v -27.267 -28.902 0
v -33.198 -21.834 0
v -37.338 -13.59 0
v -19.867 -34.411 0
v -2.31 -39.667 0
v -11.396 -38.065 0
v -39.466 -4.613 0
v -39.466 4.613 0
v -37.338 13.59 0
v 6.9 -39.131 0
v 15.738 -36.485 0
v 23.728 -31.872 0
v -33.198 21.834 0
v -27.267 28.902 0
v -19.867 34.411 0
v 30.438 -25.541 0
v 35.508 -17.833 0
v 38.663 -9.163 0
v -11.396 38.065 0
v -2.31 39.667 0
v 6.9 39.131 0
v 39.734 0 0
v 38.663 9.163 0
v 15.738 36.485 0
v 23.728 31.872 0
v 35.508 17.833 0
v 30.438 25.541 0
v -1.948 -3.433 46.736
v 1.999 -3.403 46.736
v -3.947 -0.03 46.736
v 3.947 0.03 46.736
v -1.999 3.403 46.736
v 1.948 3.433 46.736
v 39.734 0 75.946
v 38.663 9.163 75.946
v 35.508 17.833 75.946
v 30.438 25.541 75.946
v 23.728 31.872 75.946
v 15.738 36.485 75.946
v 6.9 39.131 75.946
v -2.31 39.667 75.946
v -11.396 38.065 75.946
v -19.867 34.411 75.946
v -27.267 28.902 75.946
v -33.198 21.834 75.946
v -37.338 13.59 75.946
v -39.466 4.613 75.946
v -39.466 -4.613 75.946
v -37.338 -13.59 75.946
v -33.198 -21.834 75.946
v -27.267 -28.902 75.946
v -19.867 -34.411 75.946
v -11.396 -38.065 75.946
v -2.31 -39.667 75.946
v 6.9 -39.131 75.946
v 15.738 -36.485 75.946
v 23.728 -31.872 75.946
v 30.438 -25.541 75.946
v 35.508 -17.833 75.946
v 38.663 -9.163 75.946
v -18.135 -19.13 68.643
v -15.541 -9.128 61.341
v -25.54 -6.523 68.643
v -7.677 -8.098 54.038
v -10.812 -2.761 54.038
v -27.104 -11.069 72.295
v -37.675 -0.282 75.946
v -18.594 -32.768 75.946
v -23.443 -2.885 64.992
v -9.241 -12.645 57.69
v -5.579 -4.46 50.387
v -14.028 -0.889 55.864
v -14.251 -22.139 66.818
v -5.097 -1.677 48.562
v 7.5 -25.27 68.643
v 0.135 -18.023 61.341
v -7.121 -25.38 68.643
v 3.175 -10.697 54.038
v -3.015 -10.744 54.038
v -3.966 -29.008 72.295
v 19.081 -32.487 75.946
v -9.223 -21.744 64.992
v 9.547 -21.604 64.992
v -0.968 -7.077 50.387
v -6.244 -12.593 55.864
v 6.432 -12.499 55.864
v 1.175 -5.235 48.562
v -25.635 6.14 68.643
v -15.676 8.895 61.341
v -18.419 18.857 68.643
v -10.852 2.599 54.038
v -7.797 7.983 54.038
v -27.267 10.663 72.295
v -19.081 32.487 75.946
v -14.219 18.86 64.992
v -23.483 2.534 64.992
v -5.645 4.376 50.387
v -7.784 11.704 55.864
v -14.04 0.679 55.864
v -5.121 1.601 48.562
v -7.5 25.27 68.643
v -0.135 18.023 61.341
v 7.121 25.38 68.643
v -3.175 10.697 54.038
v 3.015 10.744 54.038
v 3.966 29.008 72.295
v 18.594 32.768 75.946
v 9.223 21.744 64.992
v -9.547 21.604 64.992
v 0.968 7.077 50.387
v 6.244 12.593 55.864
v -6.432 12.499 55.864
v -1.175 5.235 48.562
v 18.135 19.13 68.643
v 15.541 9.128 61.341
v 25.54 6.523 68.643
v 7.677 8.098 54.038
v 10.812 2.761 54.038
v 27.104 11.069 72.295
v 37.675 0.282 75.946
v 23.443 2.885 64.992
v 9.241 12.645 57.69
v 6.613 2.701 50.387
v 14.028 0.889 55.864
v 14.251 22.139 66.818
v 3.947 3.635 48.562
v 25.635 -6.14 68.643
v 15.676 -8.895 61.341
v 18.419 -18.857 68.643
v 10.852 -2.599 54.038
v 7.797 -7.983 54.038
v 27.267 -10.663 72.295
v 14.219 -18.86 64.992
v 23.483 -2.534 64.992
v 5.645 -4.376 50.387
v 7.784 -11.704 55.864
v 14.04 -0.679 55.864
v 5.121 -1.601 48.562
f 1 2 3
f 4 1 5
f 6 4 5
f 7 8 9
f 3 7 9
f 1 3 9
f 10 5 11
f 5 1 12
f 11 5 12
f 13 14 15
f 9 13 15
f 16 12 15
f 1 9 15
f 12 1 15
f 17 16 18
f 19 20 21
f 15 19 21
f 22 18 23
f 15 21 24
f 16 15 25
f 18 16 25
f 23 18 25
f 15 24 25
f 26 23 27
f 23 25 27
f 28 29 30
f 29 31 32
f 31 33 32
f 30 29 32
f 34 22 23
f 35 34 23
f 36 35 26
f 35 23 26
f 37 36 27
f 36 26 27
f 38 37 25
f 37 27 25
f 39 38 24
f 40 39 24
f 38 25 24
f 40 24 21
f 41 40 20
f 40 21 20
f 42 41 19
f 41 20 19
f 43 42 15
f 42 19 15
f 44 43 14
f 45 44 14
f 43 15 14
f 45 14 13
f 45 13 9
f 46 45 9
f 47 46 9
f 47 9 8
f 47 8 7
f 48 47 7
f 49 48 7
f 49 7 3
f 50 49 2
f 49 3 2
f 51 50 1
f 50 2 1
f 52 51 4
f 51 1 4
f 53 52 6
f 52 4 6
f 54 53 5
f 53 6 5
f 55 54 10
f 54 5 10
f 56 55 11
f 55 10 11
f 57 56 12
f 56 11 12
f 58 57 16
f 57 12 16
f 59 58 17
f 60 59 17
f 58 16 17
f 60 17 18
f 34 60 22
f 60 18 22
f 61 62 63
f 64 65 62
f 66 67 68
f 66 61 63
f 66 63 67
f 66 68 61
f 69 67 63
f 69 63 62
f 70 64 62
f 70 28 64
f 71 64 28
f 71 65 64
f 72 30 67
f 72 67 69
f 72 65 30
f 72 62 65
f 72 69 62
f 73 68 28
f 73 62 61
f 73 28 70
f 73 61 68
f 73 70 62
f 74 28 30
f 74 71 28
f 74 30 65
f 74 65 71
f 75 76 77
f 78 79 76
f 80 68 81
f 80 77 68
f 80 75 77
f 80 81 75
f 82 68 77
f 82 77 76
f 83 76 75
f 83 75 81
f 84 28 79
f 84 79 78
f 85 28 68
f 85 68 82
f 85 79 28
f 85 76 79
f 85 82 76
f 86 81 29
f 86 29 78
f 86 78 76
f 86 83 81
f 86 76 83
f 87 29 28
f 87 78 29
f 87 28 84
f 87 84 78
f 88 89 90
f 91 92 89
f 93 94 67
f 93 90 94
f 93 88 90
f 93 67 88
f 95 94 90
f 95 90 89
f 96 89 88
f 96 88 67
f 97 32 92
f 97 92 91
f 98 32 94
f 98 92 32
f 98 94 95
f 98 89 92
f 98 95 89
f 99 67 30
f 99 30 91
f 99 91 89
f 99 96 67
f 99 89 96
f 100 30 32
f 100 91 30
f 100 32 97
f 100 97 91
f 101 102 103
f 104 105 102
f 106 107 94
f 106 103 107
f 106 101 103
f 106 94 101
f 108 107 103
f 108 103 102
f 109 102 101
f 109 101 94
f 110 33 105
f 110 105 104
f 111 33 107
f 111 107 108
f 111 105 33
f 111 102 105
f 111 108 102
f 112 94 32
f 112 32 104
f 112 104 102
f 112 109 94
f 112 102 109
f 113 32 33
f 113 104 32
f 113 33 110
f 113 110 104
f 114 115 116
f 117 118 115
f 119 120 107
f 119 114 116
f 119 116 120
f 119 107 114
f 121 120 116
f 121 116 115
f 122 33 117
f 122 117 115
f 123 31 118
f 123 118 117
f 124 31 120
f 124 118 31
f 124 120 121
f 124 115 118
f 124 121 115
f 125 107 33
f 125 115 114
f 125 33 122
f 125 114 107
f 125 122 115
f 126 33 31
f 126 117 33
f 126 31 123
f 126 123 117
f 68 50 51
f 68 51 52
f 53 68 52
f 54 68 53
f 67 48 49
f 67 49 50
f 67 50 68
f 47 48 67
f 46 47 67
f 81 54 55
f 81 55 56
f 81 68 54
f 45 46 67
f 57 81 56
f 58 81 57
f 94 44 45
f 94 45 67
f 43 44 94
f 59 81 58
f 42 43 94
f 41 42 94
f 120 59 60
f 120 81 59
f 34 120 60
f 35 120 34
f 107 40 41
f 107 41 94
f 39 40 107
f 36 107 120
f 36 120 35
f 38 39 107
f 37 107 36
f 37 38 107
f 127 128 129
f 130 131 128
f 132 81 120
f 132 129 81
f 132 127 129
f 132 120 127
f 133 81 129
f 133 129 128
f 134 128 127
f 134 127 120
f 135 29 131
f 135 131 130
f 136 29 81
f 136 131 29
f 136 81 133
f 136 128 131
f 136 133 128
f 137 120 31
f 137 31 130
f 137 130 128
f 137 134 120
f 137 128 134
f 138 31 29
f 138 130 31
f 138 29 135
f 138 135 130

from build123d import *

# Parameters (mm, degrees)
F0_R     = 39.7343740688
F1_DEPTH = 75.946
F3_DEPTH = 29.21
F3_TAPER = 45


with BuildPart() as f1:
    # F0 (on Top) → F1 (new body)
    with BuildSketch(Plane.XY):
        Circle(F0_R)
    extrude(amount=F1_DEPTH)

    # F2 (on face) → F3 (cut)
    with BuildSketch(Plane.XY.offset(75.946)):
        Polygon((37.6749132279, 0.2816330117), (18.5935552713, 32.7682484466), (-19.0813579566, 32.4866154349), (-37.6749132279, -0.2816330117), (-18.5935552713, -32.7682484466), (19.0813579566, -32.4866154349), align=None)
    extrude(amount=-F3_DEPTH, taper=F3_TAPER, mode=Mode.SUBTRACT)


solid = f1.part
